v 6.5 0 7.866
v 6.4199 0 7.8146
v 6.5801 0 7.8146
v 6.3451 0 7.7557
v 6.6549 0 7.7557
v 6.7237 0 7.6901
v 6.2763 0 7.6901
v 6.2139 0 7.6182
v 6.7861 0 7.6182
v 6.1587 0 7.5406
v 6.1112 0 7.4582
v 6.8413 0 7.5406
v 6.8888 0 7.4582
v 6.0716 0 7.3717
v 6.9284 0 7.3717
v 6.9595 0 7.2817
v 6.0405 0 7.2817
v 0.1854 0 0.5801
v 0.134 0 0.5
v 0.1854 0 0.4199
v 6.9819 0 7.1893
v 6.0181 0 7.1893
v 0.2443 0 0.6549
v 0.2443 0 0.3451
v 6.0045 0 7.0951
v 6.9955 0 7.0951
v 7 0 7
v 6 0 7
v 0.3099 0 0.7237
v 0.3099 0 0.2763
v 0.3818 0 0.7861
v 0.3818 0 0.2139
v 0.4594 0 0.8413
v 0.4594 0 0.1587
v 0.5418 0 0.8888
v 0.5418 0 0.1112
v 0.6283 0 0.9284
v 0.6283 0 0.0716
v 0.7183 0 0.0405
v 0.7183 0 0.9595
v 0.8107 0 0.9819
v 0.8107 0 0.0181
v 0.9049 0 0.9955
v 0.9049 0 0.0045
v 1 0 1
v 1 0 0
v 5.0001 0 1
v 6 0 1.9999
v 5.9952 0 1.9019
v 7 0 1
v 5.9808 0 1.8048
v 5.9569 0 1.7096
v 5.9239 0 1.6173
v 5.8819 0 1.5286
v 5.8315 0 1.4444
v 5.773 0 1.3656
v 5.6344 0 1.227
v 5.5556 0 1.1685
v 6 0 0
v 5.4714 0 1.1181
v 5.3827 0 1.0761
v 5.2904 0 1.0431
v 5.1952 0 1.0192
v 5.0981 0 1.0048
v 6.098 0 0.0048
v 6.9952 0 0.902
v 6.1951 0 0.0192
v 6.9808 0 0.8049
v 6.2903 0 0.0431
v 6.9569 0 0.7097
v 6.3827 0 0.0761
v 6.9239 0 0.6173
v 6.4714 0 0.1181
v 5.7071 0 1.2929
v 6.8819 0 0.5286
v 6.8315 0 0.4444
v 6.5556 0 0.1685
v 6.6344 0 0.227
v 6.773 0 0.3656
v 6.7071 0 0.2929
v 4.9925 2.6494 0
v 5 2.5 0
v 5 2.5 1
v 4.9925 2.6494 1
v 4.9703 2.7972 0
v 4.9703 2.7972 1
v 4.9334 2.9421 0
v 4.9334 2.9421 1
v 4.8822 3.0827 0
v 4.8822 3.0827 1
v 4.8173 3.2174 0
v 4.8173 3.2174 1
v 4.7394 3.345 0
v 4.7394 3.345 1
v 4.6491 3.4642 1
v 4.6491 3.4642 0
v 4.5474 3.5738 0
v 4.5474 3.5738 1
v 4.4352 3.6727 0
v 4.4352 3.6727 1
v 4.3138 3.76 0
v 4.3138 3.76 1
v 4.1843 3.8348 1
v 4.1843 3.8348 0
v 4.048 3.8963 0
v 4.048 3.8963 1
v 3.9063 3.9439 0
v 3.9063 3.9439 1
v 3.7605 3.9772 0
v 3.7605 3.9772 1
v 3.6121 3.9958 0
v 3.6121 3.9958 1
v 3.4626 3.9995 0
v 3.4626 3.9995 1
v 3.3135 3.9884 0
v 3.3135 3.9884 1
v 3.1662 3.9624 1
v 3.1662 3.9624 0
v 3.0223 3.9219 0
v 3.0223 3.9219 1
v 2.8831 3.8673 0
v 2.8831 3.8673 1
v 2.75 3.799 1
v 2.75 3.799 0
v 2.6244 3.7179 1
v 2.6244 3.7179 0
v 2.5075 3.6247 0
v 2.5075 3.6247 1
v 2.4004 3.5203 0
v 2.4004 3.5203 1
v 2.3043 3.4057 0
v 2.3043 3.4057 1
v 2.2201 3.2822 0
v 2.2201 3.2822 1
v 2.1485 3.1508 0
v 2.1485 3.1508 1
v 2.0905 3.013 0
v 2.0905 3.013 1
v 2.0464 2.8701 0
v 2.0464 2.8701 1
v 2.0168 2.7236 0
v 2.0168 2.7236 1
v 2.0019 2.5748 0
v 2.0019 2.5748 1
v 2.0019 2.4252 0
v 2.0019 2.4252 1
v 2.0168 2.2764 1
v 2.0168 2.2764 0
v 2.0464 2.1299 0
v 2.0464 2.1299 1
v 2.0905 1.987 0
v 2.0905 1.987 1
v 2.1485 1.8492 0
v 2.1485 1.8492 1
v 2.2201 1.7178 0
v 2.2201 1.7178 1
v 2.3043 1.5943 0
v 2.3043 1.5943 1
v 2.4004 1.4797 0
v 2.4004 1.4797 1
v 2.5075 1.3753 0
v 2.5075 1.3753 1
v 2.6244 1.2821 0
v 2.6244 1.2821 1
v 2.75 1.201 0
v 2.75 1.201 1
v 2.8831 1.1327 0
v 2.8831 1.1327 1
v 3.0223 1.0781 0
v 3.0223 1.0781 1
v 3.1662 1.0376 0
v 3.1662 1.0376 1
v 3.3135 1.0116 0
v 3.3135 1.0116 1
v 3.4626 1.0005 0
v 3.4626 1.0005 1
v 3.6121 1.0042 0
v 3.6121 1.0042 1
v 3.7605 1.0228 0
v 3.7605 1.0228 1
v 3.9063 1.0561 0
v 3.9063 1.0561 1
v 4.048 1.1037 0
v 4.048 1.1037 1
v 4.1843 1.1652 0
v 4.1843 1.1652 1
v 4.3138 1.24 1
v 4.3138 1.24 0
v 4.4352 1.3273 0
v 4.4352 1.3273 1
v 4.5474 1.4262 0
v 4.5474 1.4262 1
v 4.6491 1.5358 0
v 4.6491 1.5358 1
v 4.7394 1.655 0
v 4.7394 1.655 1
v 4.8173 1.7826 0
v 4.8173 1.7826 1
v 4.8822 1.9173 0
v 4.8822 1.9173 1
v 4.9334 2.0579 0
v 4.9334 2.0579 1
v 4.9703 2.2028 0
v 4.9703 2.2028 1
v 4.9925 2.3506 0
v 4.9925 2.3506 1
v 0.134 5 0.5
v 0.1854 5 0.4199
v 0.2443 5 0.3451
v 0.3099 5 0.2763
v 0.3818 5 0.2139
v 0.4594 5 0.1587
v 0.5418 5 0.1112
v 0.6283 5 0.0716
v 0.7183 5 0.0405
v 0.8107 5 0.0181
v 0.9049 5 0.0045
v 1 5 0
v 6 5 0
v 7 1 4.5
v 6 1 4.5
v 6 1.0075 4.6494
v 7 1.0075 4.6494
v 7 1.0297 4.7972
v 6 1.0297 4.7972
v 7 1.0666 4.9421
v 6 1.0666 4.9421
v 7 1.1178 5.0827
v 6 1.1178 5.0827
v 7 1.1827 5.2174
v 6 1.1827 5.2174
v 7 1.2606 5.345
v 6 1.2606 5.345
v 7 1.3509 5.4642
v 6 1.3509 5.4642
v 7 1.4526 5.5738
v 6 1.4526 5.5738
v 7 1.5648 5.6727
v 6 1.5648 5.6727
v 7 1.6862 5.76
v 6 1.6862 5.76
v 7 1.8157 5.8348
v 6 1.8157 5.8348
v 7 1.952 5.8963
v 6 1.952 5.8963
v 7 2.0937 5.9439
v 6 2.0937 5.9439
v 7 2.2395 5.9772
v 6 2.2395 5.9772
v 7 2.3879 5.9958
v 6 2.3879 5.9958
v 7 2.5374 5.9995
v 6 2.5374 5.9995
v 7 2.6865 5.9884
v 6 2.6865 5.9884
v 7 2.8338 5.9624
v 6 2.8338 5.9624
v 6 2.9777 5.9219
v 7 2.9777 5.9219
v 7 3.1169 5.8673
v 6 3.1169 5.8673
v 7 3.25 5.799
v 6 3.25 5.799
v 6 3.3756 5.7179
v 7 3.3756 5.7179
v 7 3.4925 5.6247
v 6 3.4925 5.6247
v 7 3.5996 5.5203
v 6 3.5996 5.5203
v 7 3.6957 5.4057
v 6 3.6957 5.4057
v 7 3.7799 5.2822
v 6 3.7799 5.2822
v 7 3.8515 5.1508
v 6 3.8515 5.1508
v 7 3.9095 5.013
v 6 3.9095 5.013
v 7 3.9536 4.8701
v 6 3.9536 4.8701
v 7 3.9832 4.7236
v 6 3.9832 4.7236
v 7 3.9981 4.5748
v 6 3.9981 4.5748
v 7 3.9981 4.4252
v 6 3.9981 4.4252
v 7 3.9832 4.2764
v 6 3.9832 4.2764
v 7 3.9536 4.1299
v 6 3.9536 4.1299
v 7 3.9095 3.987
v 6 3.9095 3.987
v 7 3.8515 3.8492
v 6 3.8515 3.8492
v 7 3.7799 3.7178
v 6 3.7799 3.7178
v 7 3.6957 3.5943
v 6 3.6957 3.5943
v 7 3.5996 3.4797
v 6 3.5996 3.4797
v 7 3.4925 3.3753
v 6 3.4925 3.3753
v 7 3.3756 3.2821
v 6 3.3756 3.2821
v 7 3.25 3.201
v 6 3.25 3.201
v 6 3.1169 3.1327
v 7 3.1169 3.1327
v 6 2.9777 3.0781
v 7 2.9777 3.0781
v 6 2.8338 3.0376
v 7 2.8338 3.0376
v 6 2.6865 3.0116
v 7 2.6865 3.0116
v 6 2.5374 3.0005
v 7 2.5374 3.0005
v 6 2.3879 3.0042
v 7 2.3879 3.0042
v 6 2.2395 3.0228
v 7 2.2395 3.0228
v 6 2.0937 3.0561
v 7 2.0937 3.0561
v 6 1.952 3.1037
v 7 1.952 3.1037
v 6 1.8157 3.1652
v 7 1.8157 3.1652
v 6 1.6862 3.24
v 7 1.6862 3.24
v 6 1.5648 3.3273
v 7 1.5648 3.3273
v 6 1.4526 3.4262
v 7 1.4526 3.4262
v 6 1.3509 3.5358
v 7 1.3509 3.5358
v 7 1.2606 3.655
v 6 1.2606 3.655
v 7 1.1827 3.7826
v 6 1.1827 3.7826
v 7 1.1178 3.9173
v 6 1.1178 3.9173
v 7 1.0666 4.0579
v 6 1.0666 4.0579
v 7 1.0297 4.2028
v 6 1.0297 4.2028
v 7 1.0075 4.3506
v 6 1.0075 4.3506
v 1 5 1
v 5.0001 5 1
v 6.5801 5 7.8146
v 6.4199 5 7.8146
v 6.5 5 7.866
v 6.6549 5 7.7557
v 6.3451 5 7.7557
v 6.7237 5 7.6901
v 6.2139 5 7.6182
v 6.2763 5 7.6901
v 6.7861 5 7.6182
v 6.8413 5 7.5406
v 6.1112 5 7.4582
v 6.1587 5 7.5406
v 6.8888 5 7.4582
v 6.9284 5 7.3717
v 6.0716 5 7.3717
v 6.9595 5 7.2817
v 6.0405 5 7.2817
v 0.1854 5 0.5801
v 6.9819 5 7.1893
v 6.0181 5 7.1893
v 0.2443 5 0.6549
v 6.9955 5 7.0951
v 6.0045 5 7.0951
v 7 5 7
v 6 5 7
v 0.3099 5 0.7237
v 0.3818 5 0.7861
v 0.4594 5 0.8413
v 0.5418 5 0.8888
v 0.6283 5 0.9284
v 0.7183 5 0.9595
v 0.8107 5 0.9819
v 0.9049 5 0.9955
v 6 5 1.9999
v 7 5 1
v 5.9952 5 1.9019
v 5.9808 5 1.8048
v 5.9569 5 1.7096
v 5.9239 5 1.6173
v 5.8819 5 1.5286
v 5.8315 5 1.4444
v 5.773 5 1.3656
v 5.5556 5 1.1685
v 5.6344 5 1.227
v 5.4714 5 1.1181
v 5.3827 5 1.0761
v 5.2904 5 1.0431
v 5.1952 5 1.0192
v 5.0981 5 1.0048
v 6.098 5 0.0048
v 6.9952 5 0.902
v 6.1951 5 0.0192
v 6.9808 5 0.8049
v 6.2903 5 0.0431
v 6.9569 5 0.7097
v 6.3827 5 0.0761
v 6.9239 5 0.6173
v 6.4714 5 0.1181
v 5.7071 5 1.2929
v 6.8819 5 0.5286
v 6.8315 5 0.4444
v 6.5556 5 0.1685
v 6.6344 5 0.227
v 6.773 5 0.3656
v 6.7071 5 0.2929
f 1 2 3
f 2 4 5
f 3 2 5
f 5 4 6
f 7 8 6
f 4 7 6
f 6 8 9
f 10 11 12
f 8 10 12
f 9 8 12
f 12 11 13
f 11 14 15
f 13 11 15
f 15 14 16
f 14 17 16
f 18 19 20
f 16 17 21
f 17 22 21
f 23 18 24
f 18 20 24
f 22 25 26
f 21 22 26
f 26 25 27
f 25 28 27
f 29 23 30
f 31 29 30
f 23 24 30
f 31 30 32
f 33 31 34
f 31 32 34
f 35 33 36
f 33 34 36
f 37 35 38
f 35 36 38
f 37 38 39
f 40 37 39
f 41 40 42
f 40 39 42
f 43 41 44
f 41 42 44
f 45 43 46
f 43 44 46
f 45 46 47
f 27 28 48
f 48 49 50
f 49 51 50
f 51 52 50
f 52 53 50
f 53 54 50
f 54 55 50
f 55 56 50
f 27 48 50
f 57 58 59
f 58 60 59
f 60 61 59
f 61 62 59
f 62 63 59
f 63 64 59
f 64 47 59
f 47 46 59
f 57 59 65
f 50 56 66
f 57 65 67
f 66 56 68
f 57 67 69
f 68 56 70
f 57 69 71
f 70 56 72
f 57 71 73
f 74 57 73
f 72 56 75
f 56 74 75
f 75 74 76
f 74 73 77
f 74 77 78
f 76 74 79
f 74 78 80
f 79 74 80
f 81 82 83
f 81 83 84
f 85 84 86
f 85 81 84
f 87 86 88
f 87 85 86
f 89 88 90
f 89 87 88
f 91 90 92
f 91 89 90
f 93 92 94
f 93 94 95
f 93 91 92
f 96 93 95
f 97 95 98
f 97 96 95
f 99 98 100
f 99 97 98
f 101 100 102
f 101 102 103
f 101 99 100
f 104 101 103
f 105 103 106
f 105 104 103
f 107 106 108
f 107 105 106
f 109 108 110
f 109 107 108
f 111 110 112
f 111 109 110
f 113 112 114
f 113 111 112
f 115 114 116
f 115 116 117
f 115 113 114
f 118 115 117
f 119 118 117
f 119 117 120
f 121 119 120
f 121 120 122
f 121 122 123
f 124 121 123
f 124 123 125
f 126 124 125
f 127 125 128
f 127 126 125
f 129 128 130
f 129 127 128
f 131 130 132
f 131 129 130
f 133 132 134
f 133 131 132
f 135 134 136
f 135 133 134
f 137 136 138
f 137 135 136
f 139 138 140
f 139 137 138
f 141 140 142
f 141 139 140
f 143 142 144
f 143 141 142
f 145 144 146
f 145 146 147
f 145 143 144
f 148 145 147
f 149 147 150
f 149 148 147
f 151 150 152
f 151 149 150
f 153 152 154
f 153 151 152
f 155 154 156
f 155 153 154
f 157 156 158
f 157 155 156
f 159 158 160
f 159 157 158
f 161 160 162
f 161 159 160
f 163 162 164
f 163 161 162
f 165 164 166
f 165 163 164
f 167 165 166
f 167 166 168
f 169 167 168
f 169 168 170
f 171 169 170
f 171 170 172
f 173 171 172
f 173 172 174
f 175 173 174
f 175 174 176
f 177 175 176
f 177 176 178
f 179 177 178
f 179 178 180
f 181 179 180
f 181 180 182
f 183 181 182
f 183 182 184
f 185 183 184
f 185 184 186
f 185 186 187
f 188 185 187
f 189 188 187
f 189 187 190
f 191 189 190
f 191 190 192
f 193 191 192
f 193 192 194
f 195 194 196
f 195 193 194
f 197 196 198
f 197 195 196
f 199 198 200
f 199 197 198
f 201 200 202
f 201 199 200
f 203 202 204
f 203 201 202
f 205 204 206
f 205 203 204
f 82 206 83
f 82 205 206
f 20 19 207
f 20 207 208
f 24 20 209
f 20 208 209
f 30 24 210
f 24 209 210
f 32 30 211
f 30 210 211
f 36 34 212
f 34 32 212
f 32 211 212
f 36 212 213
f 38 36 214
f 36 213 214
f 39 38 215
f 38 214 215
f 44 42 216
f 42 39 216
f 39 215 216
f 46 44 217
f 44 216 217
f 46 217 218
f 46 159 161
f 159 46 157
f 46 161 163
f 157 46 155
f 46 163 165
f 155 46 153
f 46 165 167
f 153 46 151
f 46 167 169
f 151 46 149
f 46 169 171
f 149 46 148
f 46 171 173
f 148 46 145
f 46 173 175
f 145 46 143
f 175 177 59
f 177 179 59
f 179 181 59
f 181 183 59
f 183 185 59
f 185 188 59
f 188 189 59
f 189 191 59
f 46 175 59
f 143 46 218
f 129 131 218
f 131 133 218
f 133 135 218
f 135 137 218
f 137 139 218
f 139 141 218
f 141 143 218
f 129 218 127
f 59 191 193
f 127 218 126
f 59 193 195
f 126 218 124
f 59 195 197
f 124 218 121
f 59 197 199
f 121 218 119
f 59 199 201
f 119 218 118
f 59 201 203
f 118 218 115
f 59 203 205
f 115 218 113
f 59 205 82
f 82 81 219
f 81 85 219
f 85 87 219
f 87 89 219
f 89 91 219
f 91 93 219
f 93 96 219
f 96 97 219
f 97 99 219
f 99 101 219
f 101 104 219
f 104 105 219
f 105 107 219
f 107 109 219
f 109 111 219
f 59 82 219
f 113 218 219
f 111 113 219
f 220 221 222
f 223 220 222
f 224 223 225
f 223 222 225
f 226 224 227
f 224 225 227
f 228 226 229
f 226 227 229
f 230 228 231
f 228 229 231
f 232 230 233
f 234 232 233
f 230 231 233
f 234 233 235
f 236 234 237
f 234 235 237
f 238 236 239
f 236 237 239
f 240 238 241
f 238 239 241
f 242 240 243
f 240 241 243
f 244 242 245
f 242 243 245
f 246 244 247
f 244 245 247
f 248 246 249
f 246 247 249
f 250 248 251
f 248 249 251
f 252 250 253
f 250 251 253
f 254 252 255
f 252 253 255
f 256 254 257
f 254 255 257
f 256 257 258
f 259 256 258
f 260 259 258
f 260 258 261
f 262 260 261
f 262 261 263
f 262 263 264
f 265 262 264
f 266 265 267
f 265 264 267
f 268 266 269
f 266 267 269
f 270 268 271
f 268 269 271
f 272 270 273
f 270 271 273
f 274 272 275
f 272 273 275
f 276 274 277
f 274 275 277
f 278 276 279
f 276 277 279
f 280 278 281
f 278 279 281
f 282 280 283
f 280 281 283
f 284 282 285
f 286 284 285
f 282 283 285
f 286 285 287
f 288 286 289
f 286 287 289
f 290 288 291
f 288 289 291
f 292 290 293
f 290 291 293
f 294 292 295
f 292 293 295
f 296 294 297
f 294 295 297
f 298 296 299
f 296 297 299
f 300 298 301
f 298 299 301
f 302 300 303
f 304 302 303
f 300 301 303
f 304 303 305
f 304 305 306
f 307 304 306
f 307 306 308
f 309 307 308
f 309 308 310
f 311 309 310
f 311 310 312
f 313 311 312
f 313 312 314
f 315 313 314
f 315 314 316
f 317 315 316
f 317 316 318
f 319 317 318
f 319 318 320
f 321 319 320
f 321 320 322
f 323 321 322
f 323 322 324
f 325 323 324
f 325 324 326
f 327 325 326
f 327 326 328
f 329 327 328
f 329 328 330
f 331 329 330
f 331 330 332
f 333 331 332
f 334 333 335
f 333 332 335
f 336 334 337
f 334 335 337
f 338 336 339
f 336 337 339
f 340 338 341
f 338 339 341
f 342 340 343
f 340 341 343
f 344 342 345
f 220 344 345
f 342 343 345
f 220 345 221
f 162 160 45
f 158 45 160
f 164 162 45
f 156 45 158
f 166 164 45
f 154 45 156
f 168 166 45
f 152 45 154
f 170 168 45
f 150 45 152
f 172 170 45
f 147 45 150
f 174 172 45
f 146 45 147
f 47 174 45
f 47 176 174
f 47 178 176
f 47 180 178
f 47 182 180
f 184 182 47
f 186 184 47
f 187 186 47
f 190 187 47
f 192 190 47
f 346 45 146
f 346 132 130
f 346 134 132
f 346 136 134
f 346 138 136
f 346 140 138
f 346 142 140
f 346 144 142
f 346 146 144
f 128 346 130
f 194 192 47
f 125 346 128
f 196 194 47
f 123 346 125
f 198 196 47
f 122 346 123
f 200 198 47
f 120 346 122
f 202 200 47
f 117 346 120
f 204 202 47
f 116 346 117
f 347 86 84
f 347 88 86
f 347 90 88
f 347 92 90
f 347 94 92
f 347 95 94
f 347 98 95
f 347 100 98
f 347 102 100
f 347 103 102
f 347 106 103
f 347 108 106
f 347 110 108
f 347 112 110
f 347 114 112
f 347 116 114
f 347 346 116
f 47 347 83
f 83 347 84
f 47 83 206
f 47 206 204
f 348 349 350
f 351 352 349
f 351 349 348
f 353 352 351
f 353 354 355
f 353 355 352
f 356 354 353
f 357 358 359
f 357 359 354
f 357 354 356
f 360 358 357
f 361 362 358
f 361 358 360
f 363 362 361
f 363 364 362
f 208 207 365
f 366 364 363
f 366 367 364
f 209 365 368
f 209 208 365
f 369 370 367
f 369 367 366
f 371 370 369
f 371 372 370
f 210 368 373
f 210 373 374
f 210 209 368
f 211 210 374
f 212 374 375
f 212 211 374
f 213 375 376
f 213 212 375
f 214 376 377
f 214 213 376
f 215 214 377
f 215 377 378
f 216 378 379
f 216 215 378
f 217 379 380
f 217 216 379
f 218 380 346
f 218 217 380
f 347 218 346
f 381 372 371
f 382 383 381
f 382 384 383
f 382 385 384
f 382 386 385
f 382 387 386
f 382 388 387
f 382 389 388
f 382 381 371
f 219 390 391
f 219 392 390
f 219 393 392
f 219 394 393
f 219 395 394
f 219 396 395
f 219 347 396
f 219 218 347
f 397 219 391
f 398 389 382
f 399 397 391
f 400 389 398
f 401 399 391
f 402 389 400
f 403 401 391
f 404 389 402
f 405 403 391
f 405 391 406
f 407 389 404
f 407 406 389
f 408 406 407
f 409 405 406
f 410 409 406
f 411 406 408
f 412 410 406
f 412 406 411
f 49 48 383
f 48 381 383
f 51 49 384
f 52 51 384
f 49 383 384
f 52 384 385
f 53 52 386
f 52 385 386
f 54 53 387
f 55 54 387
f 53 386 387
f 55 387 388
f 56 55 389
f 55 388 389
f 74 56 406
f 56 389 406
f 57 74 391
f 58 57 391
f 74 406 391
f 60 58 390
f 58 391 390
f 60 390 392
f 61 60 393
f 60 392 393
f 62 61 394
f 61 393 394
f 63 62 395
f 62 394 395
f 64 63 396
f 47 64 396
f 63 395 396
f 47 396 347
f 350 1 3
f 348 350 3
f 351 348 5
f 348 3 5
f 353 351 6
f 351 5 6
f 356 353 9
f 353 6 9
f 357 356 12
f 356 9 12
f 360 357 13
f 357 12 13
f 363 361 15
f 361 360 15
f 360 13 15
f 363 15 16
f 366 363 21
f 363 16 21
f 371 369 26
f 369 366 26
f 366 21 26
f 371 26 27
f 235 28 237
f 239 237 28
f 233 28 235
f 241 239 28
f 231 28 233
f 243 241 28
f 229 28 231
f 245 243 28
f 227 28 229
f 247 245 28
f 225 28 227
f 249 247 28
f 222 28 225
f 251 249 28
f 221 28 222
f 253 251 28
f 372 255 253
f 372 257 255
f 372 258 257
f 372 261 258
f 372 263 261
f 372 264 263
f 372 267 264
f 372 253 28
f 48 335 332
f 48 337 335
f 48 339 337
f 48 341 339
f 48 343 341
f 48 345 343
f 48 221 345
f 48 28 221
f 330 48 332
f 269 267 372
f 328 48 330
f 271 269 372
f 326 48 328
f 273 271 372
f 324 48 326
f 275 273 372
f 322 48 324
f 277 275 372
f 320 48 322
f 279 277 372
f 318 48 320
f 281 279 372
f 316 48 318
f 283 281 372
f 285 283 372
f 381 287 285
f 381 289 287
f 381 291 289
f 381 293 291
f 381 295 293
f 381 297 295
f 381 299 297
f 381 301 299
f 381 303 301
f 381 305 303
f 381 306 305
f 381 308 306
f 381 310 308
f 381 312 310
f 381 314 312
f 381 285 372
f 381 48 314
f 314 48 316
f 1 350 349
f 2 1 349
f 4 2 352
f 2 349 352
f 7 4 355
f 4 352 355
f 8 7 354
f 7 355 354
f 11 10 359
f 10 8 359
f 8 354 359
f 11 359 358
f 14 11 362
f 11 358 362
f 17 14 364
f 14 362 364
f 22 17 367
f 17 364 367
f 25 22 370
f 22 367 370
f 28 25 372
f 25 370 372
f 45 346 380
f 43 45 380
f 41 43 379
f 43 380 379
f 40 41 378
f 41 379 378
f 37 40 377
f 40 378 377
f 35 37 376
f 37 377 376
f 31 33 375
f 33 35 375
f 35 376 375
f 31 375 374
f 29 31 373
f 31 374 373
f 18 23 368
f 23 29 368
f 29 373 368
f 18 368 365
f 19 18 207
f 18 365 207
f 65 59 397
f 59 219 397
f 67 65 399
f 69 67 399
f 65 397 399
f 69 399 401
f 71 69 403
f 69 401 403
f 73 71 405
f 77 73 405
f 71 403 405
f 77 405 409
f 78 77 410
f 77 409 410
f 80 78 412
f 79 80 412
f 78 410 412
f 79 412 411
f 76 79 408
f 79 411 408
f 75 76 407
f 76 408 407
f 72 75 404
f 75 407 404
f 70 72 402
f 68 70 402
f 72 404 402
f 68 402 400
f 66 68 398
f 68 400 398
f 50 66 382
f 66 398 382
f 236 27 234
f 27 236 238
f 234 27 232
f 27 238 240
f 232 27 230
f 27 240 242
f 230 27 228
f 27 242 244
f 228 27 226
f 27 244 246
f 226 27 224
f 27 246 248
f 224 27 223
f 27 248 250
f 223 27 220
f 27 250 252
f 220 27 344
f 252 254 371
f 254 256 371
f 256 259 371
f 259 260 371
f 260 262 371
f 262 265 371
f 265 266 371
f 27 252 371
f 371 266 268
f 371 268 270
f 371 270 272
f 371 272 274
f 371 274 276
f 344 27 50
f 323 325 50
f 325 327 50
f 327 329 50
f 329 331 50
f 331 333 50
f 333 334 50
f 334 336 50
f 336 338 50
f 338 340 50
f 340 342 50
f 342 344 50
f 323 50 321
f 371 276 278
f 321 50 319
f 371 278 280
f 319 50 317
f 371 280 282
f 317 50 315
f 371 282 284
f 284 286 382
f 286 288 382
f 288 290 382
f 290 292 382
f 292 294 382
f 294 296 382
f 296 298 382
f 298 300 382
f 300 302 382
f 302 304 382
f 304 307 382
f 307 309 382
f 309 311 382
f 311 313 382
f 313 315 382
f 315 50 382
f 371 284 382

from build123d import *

# Parameters (mm, degrees)
SKETCH1_W           = 7
SKETCH1_H           = 5
SKETCH1_R           = 1.5
BOSS_EXTRUDE1_DEPTH = 1
SKETCH2_W           = 1
SKETCH2_H           = 5
BOSS_EXTRUDE2_DEPTH = 7
SKETCH3_R           = 1.5
CUT_EXTRUDE1_DEPTH  = 1
FILLET1_R           = 1
FILLET4_R           = 1
FILLET5_R           = 1


# Some blends are built 0.0001 mm under size
with BuildPart() as part:
    # Sketch1 → Boss-Extrude1 (new body)
    with BuildSketch(Plane.XY):
        with Locations((3.5, 2.5)):
            Rectangle(SKETCH1_W, SKETCH1_H)
        with Locations((3.5, 2.5)):
            Circle(SKETCH1_R, mode=Mode.SUBTRACT)
    extrude(amount=BOSS_EXTRUDE1_DEPTH)

    # Sketch2 → Boss-Extrude2 (add)
    with BuildSketch(Plane.XY.offset(1)):
        with Locations((6.5, 2.5)):
            Rectangle(SKETCH2_W, SKETCH2_H)
    extrude(amount=BOSS_EXTRUDE2_DEPTH)

    # Sketch3 → Cut-Extrude1 (cut)
    with BuildSketch(Plane.ZY.offset(-6)):
        with Locations(Location((4.5, 2.5, 0), (0, 0, 270))):
            Circle(SKETCH3_R)
    extrude(amount=-CUT_EXTRUDE1_DEPTH, mode=Mode.SUBTRACT)

    # Fillet1
    fillet1_edges = [part.edges().sort_by_distance(p)[0] for p in [
        (6, 2.5, 1),
    ]]
    fillet(fillet1_edges, radius=FILLET1_R - 0.0001)  # a hair under: the kernel refuses the full size

    # Fillet4
    # the kernel refuses this fillet: 1 mm, written as the material it takes off along each edge
    with BuildSketch(Plane(origin=(7, -2.5, 8), x_dir=(-1, 0, 0), z_dir=(0, 1, 0)), Plane(origin=(0, 7.5, 1), x_dir=(1, 0, 0), z_dir=(0, -1, 0)), Plane(origin=(0, 7.5, 0), x_dir=(0, 0, 1), z_dir=(0, -1, 0))) as fillet4_piece_1:
        with BuildLine():
            CenterArc((FILLET4_R, -FILLET4_R), FILLET4_R, 90, 90)
            Line((0, -FILLET4_R), (0, 0))
            Line((0, 0), (FILLET4_R, 0))
        make_face()
    extrude(amount=10, mode=Mode.SUBTRACT)
    with BuildSketch(Plane(origin=(6, 7.5, 8), x_dir=(0, 0, -1), z_dir=(0, -1, 0))) as fillet4_piece_2:
        with BuildLine():
            CenterArc((FILLET4_R, FILLET4_R), FILLET4_R, 180, 90)
            Line((0, FILLET4_R), (0, 0))
            Line((0, 0), (FILLET4_R, 0))
        make_face()
    extrude(amount=10, mode=Mode.SUBTRACT)

    # Fillet5
    fillet5_edges = [part.edges().sort_by_distance(p)[0] for p in [
        (7, 2.5, 0),
    ]]
    fillet(fillet5_edges, radius=FILLET5_R)


solid = part.part
